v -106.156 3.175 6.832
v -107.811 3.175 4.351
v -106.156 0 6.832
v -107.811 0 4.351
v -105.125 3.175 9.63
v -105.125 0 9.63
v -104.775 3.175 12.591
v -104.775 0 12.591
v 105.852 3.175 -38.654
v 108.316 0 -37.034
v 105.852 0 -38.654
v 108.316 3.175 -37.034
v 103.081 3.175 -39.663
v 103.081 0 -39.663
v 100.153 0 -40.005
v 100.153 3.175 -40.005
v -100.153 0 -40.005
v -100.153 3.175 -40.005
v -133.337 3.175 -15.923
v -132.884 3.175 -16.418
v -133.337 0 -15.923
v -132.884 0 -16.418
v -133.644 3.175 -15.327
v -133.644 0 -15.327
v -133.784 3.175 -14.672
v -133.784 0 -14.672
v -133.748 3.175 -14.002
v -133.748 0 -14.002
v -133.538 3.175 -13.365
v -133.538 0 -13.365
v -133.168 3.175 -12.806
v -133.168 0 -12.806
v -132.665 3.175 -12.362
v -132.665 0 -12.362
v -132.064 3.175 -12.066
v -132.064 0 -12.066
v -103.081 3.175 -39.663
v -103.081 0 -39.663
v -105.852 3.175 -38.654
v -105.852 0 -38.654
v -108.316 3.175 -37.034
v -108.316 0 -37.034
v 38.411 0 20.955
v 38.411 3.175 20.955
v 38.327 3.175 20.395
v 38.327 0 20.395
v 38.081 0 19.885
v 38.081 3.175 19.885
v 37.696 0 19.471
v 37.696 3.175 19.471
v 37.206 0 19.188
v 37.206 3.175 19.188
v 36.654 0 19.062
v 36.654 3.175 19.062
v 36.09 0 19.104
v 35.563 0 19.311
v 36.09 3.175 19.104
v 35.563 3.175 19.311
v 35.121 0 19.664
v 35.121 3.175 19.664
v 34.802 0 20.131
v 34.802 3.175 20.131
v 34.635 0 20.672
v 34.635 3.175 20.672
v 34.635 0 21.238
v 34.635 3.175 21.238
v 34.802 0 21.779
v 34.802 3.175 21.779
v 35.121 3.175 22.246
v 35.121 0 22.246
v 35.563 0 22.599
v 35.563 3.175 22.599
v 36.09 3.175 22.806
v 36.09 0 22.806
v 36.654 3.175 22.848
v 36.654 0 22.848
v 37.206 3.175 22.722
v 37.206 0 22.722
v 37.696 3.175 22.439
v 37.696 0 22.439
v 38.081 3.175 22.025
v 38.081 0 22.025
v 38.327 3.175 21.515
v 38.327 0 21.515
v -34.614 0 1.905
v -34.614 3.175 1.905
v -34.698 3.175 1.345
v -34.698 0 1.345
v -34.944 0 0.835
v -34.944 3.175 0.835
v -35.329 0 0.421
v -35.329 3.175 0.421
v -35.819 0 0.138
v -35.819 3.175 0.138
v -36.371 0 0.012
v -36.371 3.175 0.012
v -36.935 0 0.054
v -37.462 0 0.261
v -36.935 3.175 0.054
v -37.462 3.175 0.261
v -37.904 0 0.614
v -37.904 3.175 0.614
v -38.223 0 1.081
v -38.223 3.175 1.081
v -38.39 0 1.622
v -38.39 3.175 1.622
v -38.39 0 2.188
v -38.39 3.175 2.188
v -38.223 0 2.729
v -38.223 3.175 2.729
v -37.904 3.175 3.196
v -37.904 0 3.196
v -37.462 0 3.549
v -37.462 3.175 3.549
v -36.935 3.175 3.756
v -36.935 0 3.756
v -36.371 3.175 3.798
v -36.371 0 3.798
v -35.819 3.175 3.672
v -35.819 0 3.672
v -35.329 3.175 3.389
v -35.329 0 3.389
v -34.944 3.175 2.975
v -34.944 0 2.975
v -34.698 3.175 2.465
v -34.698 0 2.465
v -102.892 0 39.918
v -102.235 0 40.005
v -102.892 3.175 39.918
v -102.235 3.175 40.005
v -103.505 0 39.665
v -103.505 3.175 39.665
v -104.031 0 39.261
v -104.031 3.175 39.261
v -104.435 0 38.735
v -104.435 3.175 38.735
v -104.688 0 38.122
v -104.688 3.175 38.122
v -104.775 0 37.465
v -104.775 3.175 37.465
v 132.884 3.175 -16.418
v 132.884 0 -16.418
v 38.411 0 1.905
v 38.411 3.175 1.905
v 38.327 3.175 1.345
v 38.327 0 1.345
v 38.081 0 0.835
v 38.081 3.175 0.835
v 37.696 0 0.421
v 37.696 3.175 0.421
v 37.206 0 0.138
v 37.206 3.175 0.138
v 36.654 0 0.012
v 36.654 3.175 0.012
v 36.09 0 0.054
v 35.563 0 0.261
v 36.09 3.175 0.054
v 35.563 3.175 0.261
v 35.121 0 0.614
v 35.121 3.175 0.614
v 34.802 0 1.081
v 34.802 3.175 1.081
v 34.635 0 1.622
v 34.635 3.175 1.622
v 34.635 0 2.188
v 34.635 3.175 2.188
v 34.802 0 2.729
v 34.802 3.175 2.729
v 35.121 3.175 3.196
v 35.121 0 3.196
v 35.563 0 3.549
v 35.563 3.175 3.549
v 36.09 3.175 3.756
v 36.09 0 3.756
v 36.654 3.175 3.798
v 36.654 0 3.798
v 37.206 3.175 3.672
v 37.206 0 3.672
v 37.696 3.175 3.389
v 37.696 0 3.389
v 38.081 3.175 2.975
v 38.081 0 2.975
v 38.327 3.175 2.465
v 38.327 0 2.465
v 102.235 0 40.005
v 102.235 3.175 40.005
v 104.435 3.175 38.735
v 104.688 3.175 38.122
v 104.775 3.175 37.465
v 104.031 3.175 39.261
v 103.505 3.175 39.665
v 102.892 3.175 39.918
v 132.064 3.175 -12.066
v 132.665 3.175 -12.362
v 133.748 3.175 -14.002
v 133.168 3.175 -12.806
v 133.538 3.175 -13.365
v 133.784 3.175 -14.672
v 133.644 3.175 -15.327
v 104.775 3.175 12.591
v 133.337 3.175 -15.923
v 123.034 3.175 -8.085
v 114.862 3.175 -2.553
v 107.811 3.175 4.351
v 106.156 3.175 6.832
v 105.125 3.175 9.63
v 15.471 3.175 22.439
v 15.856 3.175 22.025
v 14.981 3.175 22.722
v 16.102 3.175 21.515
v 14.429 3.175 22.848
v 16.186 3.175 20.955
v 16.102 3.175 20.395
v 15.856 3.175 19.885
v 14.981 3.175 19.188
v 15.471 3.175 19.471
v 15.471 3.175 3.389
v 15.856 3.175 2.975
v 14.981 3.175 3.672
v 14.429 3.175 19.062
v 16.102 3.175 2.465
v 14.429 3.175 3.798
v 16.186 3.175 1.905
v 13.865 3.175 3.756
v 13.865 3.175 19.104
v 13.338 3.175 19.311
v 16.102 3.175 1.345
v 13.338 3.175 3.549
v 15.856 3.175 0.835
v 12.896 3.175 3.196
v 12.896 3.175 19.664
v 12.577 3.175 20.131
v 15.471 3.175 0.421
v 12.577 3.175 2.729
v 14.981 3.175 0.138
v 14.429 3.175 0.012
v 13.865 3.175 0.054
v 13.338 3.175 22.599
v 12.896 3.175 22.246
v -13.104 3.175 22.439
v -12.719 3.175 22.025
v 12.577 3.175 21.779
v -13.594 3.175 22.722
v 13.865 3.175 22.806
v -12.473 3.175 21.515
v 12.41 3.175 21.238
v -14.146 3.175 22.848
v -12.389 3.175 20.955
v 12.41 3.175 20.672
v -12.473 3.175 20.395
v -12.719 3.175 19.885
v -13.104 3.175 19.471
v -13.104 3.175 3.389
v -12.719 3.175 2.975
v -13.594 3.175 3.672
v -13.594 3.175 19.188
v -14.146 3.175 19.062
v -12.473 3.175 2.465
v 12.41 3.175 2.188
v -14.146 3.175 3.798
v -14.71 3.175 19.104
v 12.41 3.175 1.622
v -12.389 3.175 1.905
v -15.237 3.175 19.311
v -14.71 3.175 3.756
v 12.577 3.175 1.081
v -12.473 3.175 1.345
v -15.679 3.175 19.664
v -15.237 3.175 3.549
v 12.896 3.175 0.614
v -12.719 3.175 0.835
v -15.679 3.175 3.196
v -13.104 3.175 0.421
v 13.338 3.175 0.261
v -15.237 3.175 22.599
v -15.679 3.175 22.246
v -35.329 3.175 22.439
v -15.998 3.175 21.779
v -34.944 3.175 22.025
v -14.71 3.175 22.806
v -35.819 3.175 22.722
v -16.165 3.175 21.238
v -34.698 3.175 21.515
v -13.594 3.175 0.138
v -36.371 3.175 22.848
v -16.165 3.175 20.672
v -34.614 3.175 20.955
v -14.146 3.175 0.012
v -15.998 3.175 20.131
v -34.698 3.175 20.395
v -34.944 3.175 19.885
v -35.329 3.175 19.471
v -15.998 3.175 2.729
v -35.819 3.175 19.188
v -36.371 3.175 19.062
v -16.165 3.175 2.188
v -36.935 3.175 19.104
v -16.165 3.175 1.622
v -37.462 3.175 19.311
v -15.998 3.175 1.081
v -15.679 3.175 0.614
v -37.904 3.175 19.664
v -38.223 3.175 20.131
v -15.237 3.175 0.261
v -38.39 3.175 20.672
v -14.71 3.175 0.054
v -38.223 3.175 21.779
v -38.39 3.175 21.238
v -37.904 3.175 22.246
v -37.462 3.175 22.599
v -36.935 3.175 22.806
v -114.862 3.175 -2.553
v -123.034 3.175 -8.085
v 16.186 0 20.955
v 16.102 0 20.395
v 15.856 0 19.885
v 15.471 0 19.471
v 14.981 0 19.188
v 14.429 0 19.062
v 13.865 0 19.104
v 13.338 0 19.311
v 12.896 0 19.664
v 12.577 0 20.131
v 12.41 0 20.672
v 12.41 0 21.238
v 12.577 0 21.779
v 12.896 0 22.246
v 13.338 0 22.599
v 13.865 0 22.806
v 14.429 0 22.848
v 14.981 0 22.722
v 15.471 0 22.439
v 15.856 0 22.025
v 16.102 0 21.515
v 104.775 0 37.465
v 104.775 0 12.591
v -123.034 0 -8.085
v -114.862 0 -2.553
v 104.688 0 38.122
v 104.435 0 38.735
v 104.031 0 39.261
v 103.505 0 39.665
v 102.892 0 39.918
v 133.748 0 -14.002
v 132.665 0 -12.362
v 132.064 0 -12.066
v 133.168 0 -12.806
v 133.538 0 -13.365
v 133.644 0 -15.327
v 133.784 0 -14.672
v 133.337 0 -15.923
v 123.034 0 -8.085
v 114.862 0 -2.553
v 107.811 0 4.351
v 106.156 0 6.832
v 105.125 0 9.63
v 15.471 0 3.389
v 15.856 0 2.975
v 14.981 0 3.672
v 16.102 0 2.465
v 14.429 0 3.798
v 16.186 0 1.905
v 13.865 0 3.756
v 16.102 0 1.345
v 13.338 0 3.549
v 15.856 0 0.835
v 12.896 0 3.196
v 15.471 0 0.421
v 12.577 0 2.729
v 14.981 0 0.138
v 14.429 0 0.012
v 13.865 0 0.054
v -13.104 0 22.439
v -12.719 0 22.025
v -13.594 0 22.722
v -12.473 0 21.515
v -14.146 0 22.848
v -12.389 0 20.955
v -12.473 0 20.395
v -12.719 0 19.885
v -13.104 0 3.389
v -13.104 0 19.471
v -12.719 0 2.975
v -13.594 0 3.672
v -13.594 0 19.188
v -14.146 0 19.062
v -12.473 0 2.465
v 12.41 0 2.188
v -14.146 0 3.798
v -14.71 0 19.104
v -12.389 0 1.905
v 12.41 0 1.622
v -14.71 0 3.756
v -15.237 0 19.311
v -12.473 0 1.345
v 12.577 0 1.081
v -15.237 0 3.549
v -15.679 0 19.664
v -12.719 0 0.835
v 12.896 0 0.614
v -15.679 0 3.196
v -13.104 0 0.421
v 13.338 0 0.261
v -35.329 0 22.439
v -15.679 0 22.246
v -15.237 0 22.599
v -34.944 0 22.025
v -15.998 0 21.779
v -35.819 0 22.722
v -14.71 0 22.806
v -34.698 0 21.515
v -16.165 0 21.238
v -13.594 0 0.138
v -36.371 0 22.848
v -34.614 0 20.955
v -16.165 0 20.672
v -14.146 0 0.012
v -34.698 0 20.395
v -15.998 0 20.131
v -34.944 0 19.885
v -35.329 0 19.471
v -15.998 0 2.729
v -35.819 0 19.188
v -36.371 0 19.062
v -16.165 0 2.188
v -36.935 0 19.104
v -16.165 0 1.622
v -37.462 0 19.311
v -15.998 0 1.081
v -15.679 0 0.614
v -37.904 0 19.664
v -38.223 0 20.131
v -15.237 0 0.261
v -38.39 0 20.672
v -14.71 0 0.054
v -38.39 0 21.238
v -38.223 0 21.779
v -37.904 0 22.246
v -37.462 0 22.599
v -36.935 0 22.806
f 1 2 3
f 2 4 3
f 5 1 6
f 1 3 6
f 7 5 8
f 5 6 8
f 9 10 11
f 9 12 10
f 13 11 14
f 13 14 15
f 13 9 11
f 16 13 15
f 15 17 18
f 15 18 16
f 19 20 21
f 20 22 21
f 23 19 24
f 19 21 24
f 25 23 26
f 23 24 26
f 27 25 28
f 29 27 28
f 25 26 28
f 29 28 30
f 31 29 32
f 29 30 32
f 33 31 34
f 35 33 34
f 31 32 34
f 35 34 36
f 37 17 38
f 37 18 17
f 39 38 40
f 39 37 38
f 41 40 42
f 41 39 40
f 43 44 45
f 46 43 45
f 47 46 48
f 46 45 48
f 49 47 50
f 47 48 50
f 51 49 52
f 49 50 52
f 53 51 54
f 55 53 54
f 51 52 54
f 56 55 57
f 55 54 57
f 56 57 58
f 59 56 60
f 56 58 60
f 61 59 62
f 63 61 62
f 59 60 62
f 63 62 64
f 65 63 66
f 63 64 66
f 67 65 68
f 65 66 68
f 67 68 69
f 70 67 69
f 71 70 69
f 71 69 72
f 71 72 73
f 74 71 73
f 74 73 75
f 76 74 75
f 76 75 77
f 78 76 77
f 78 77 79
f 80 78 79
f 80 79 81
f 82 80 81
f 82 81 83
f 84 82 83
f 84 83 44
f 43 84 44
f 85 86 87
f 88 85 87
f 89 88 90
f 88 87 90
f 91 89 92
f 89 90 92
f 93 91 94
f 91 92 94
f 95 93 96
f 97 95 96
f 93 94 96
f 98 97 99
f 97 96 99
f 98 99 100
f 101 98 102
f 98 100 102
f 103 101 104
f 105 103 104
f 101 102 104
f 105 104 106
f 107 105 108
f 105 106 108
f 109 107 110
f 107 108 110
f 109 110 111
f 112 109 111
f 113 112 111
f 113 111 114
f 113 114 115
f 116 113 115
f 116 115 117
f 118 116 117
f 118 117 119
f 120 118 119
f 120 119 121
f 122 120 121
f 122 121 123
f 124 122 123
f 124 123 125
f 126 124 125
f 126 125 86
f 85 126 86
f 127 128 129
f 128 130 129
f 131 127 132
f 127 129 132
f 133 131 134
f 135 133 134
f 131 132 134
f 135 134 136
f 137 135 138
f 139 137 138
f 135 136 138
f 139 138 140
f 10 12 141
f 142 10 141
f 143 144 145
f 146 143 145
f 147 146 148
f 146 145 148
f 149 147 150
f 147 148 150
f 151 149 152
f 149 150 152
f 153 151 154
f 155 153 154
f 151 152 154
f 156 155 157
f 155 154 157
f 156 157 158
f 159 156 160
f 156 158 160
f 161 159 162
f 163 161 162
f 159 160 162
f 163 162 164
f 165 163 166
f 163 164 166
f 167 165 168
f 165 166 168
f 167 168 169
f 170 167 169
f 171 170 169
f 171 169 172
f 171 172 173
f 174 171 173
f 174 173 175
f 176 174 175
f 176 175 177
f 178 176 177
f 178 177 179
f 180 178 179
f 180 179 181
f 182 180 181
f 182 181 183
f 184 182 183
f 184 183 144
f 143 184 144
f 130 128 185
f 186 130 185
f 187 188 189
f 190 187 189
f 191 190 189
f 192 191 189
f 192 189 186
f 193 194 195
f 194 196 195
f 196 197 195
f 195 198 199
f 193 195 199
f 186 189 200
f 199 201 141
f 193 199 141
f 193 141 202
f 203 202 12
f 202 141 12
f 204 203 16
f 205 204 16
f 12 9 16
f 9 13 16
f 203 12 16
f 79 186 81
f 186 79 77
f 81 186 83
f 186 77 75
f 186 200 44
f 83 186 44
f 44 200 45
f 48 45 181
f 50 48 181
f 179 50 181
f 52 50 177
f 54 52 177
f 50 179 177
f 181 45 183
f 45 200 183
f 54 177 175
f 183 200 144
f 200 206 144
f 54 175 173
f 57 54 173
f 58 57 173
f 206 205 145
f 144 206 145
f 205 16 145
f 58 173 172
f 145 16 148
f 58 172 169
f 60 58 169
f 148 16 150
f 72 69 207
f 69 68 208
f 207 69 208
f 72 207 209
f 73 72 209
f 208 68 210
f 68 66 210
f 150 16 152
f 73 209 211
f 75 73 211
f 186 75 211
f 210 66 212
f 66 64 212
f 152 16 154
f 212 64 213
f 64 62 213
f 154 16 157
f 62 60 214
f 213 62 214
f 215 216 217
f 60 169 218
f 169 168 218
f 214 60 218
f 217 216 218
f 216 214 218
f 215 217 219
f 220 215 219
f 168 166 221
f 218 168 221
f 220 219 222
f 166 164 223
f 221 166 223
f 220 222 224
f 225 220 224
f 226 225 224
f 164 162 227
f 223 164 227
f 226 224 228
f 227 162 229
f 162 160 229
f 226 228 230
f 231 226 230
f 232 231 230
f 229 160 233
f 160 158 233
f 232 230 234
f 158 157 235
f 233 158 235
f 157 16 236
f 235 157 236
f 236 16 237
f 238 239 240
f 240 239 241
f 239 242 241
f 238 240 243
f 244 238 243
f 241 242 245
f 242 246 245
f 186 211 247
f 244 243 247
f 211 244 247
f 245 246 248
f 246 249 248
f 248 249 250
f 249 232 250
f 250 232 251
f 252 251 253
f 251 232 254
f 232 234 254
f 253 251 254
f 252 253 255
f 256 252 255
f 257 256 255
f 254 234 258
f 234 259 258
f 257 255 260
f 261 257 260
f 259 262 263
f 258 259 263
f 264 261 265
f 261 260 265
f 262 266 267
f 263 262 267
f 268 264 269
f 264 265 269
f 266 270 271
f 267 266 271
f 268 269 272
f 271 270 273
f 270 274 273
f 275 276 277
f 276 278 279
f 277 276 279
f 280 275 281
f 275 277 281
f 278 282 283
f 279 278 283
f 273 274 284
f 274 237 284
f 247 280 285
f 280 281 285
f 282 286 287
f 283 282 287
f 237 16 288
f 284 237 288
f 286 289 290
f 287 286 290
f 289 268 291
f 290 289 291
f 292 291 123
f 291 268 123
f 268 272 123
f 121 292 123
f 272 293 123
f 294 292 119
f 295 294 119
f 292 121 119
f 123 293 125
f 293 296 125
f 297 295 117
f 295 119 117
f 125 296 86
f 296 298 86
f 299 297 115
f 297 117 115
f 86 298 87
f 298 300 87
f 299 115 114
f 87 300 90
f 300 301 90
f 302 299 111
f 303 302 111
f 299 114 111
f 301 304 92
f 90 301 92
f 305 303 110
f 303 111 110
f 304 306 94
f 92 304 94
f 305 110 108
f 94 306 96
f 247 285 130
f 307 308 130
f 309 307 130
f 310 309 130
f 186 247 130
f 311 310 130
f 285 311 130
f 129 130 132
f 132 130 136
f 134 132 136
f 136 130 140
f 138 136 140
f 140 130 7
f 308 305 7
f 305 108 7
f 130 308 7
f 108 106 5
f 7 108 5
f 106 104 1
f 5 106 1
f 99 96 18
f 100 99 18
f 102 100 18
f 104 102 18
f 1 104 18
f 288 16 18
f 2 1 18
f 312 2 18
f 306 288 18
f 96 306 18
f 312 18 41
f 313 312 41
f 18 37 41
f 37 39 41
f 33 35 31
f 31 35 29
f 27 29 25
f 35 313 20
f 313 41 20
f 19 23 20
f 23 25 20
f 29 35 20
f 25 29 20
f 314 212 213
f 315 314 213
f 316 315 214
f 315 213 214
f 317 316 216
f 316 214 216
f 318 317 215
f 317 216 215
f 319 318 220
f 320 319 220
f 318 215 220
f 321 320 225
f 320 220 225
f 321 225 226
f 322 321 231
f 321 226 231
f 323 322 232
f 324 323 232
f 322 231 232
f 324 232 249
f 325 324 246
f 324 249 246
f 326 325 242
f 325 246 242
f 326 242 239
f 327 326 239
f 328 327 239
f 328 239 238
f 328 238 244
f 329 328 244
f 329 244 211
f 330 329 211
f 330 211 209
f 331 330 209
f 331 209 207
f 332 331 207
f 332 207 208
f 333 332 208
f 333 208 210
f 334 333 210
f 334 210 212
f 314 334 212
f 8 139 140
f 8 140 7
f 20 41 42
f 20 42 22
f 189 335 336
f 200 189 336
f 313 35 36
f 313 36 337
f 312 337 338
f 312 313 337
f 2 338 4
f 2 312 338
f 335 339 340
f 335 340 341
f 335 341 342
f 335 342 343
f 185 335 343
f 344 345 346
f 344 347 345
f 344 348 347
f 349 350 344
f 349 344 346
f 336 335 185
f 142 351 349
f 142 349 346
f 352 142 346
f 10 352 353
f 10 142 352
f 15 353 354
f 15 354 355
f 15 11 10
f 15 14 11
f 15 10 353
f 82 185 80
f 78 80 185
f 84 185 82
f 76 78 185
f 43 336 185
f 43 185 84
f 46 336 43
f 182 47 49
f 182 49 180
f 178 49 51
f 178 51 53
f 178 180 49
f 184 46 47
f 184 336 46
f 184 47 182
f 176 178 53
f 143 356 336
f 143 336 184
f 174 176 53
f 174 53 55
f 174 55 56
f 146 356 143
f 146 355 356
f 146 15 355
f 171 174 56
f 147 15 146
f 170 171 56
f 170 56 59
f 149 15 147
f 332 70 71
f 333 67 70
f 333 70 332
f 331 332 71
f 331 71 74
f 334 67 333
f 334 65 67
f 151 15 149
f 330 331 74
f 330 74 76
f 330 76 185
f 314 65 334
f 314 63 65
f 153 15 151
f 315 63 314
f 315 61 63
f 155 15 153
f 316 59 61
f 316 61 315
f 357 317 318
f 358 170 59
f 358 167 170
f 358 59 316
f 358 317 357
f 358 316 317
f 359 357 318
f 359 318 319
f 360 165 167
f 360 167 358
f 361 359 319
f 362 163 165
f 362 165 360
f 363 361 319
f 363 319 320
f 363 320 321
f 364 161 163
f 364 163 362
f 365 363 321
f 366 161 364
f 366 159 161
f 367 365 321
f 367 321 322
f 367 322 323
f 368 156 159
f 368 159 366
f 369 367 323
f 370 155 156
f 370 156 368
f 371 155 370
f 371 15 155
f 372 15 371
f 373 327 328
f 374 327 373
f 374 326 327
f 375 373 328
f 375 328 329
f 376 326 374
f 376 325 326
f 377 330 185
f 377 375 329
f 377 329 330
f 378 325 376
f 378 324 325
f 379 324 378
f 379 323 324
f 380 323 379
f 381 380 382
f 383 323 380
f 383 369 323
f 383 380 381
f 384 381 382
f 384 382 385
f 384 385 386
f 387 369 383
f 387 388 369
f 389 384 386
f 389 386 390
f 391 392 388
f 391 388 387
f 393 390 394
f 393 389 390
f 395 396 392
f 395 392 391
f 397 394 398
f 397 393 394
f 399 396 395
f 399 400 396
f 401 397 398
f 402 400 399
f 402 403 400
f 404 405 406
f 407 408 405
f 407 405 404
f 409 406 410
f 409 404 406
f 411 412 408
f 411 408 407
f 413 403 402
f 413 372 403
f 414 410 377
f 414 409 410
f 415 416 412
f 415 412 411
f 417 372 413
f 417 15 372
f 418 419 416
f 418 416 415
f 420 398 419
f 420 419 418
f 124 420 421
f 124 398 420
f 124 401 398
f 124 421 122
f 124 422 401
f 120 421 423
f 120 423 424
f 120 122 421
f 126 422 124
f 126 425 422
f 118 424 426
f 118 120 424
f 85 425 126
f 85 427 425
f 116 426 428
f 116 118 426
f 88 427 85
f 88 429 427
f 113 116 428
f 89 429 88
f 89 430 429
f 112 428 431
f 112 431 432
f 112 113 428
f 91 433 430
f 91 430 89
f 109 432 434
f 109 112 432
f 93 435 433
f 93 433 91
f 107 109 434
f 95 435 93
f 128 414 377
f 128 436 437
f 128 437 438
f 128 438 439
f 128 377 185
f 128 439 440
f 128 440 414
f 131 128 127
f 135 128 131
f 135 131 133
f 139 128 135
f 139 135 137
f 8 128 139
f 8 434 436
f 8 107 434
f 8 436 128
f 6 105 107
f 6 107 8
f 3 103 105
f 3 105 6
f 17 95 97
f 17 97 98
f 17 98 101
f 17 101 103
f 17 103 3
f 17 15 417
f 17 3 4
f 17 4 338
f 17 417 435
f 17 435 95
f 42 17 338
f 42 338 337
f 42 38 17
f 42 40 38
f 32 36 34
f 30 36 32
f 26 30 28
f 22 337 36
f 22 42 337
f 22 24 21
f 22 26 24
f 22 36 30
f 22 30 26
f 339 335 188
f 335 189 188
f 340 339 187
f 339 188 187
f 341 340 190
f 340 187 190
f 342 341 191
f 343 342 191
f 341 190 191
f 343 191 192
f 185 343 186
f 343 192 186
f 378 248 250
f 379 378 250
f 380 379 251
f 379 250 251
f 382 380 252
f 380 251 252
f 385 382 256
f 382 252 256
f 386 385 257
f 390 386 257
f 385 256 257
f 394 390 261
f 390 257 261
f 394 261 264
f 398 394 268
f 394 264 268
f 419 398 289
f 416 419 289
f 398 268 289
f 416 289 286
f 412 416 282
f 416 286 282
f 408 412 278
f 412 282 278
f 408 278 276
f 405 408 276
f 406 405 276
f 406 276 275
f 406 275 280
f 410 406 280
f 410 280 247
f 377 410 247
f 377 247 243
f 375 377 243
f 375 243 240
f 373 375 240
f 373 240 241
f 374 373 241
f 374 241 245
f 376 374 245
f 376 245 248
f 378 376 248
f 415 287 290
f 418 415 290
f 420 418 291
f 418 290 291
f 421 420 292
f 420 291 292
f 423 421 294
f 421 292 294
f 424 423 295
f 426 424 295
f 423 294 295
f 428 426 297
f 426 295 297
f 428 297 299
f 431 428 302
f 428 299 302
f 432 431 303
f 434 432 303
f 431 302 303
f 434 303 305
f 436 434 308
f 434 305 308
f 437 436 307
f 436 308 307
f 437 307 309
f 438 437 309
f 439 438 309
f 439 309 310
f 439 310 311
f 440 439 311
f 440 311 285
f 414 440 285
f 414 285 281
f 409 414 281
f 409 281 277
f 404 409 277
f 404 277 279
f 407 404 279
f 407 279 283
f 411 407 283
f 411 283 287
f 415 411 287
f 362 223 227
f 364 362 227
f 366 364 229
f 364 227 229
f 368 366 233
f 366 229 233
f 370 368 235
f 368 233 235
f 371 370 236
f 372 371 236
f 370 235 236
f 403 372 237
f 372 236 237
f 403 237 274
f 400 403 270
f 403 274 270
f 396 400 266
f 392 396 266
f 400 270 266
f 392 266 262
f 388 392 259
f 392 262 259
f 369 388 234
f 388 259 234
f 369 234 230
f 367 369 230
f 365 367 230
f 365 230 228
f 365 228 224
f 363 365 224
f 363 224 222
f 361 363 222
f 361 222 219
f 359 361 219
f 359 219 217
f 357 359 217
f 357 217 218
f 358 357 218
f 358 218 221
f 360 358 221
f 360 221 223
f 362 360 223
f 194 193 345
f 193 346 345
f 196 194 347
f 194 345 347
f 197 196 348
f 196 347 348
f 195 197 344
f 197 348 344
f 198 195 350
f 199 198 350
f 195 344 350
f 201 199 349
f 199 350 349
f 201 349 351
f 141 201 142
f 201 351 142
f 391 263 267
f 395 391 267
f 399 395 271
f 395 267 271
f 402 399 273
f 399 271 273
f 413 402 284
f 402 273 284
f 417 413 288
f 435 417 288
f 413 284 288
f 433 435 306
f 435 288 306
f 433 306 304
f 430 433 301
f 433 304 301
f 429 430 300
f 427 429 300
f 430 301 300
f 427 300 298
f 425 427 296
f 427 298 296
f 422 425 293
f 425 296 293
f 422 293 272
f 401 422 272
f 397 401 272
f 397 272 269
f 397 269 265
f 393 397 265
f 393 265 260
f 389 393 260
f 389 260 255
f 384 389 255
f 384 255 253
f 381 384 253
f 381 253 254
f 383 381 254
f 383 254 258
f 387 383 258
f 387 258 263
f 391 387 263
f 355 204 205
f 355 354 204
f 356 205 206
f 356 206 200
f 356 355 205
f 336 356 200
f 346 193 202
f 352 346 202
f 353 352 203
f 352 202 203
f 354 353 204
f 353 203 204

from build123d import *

# Parameters (mm, degrees)
SKETCH1_W           = 209.55
SKETCH1_H           = 80.01
BOSS_EXTRUDE1_DEPTH = 3.175
BOSS_EXTRUDE2_DEPTH = 3.175
SKETCH3_R           = 1.89865
CUT_EXTRUDE1_DEPTH  = 4.175
FILLET1_R           = 12.7
FILLET3_R           = 2.54
FILLET4_R           = 12.7


with BuildPart() as part:
    # Sketch1 → Boss-Extrude1 (new body)
    with BuildSketch(Plane(origin=(0, 0, 0), x_dir=(1, 0, 0), z_dir=(0, 1, 0))):
        Rectangle(SKETCH1_W, SKETCH1_H)
    extrude(amount=BOSS_EXTRUDE1_DEPTH)

    # Sketch2 → Boss-Extrude2 (add, through all)
    with BuildSketch(Plane(origin=(0, 3.175, 0), x_dir=(1, 0, 0), z_dir=(0, 1, 0))):
        with BuildLine():
            Line((104.775, 40.005), (136.525, 13.36358671))
            ThreePointArc((136.525, 13.36358671), (118.699650285, 5.41866207), (104.775, -8.255))
            Line((104.775, -8.255), (104.775, 40.005))
        make_face()
        with BuildLine():
            Line((-104.775, 40.005), (-136.525, 13.36358671))
            ThreePointArc((-136.525, 13.36358671), (-118.699650285, 5.41866207), (-104.775, -8.255))
            Line((-104.775, -8.255), (-104.775, 40.005))
        make_face()
    extrude(amount=-BOSS_EXTRUDE2_DEPTH)

    # Sketch3 → Cut-Extrude1 (cut, through all)
    with BuildSketch(Plane(origin=(0, 3.175, 0), x_dir=(1, 0, 0), z_dir=(0, 1, 0))):
        with Locations((36.5125, -20.955)):
            Circle(SKETCH3_R)
        with Locations((14.2875, -20.955)):
            Circle(SKETCH3_R)
        with Locations((-14.2875, -20.955)):
            Circle(SKETCH3_R)
        with Locations((-36.5125, -20.955)):
            Circle(SKETCH3_R)
        with Locations((36.5125, -1.905)):
            Circle(SKETCH3_R)
        with Locations((14.2875, -1.905)):
            Circle(SKETCH3_R)
        with Locations((-14.2875, -1.905)):
            Circle(SKETCH3_R)
        with Locations((-36.5125, -1.905)):
            Circle(SKETCH3_R)
    extrude(amount=-CUT_EXTRUDE1_DEPTH, mode=Mode.SUBTRACT)

    # Fillet1
    fillet1_edges = [part.edges().sort_by_distance(p)[0] for p in [
        (104.775, 1.5875, 8.255),
        (-104.775, 1.5875, 8.255),
    ]]
    fillet(fillet1_edges, radius=FILLET1_R)

    # Fillet3
    fillet3_edges = [part.edges().sort_by_distance(p)[0] for p in [
        (136.525, 1.5875, -13.36358671),
        (-136.525, 1.5875, -13.36358671),
        (104.775, 1.5875, 40.005),
        (-104.775, 1.5875, 40.005),
    ]]
    fillet(fillet3_edges, radius=FILLET3_R)

    # Fillet4
    fillet4_edges = [part.edges().sort_by_distance(p)[0] for p in [
        (-104.775, 1.5875, -40.005),
        (104.775, 1.5875, -40.005),
    ]]
    fillet(fillet4_edges, radius=FILLET4_R)


solid = part.part
